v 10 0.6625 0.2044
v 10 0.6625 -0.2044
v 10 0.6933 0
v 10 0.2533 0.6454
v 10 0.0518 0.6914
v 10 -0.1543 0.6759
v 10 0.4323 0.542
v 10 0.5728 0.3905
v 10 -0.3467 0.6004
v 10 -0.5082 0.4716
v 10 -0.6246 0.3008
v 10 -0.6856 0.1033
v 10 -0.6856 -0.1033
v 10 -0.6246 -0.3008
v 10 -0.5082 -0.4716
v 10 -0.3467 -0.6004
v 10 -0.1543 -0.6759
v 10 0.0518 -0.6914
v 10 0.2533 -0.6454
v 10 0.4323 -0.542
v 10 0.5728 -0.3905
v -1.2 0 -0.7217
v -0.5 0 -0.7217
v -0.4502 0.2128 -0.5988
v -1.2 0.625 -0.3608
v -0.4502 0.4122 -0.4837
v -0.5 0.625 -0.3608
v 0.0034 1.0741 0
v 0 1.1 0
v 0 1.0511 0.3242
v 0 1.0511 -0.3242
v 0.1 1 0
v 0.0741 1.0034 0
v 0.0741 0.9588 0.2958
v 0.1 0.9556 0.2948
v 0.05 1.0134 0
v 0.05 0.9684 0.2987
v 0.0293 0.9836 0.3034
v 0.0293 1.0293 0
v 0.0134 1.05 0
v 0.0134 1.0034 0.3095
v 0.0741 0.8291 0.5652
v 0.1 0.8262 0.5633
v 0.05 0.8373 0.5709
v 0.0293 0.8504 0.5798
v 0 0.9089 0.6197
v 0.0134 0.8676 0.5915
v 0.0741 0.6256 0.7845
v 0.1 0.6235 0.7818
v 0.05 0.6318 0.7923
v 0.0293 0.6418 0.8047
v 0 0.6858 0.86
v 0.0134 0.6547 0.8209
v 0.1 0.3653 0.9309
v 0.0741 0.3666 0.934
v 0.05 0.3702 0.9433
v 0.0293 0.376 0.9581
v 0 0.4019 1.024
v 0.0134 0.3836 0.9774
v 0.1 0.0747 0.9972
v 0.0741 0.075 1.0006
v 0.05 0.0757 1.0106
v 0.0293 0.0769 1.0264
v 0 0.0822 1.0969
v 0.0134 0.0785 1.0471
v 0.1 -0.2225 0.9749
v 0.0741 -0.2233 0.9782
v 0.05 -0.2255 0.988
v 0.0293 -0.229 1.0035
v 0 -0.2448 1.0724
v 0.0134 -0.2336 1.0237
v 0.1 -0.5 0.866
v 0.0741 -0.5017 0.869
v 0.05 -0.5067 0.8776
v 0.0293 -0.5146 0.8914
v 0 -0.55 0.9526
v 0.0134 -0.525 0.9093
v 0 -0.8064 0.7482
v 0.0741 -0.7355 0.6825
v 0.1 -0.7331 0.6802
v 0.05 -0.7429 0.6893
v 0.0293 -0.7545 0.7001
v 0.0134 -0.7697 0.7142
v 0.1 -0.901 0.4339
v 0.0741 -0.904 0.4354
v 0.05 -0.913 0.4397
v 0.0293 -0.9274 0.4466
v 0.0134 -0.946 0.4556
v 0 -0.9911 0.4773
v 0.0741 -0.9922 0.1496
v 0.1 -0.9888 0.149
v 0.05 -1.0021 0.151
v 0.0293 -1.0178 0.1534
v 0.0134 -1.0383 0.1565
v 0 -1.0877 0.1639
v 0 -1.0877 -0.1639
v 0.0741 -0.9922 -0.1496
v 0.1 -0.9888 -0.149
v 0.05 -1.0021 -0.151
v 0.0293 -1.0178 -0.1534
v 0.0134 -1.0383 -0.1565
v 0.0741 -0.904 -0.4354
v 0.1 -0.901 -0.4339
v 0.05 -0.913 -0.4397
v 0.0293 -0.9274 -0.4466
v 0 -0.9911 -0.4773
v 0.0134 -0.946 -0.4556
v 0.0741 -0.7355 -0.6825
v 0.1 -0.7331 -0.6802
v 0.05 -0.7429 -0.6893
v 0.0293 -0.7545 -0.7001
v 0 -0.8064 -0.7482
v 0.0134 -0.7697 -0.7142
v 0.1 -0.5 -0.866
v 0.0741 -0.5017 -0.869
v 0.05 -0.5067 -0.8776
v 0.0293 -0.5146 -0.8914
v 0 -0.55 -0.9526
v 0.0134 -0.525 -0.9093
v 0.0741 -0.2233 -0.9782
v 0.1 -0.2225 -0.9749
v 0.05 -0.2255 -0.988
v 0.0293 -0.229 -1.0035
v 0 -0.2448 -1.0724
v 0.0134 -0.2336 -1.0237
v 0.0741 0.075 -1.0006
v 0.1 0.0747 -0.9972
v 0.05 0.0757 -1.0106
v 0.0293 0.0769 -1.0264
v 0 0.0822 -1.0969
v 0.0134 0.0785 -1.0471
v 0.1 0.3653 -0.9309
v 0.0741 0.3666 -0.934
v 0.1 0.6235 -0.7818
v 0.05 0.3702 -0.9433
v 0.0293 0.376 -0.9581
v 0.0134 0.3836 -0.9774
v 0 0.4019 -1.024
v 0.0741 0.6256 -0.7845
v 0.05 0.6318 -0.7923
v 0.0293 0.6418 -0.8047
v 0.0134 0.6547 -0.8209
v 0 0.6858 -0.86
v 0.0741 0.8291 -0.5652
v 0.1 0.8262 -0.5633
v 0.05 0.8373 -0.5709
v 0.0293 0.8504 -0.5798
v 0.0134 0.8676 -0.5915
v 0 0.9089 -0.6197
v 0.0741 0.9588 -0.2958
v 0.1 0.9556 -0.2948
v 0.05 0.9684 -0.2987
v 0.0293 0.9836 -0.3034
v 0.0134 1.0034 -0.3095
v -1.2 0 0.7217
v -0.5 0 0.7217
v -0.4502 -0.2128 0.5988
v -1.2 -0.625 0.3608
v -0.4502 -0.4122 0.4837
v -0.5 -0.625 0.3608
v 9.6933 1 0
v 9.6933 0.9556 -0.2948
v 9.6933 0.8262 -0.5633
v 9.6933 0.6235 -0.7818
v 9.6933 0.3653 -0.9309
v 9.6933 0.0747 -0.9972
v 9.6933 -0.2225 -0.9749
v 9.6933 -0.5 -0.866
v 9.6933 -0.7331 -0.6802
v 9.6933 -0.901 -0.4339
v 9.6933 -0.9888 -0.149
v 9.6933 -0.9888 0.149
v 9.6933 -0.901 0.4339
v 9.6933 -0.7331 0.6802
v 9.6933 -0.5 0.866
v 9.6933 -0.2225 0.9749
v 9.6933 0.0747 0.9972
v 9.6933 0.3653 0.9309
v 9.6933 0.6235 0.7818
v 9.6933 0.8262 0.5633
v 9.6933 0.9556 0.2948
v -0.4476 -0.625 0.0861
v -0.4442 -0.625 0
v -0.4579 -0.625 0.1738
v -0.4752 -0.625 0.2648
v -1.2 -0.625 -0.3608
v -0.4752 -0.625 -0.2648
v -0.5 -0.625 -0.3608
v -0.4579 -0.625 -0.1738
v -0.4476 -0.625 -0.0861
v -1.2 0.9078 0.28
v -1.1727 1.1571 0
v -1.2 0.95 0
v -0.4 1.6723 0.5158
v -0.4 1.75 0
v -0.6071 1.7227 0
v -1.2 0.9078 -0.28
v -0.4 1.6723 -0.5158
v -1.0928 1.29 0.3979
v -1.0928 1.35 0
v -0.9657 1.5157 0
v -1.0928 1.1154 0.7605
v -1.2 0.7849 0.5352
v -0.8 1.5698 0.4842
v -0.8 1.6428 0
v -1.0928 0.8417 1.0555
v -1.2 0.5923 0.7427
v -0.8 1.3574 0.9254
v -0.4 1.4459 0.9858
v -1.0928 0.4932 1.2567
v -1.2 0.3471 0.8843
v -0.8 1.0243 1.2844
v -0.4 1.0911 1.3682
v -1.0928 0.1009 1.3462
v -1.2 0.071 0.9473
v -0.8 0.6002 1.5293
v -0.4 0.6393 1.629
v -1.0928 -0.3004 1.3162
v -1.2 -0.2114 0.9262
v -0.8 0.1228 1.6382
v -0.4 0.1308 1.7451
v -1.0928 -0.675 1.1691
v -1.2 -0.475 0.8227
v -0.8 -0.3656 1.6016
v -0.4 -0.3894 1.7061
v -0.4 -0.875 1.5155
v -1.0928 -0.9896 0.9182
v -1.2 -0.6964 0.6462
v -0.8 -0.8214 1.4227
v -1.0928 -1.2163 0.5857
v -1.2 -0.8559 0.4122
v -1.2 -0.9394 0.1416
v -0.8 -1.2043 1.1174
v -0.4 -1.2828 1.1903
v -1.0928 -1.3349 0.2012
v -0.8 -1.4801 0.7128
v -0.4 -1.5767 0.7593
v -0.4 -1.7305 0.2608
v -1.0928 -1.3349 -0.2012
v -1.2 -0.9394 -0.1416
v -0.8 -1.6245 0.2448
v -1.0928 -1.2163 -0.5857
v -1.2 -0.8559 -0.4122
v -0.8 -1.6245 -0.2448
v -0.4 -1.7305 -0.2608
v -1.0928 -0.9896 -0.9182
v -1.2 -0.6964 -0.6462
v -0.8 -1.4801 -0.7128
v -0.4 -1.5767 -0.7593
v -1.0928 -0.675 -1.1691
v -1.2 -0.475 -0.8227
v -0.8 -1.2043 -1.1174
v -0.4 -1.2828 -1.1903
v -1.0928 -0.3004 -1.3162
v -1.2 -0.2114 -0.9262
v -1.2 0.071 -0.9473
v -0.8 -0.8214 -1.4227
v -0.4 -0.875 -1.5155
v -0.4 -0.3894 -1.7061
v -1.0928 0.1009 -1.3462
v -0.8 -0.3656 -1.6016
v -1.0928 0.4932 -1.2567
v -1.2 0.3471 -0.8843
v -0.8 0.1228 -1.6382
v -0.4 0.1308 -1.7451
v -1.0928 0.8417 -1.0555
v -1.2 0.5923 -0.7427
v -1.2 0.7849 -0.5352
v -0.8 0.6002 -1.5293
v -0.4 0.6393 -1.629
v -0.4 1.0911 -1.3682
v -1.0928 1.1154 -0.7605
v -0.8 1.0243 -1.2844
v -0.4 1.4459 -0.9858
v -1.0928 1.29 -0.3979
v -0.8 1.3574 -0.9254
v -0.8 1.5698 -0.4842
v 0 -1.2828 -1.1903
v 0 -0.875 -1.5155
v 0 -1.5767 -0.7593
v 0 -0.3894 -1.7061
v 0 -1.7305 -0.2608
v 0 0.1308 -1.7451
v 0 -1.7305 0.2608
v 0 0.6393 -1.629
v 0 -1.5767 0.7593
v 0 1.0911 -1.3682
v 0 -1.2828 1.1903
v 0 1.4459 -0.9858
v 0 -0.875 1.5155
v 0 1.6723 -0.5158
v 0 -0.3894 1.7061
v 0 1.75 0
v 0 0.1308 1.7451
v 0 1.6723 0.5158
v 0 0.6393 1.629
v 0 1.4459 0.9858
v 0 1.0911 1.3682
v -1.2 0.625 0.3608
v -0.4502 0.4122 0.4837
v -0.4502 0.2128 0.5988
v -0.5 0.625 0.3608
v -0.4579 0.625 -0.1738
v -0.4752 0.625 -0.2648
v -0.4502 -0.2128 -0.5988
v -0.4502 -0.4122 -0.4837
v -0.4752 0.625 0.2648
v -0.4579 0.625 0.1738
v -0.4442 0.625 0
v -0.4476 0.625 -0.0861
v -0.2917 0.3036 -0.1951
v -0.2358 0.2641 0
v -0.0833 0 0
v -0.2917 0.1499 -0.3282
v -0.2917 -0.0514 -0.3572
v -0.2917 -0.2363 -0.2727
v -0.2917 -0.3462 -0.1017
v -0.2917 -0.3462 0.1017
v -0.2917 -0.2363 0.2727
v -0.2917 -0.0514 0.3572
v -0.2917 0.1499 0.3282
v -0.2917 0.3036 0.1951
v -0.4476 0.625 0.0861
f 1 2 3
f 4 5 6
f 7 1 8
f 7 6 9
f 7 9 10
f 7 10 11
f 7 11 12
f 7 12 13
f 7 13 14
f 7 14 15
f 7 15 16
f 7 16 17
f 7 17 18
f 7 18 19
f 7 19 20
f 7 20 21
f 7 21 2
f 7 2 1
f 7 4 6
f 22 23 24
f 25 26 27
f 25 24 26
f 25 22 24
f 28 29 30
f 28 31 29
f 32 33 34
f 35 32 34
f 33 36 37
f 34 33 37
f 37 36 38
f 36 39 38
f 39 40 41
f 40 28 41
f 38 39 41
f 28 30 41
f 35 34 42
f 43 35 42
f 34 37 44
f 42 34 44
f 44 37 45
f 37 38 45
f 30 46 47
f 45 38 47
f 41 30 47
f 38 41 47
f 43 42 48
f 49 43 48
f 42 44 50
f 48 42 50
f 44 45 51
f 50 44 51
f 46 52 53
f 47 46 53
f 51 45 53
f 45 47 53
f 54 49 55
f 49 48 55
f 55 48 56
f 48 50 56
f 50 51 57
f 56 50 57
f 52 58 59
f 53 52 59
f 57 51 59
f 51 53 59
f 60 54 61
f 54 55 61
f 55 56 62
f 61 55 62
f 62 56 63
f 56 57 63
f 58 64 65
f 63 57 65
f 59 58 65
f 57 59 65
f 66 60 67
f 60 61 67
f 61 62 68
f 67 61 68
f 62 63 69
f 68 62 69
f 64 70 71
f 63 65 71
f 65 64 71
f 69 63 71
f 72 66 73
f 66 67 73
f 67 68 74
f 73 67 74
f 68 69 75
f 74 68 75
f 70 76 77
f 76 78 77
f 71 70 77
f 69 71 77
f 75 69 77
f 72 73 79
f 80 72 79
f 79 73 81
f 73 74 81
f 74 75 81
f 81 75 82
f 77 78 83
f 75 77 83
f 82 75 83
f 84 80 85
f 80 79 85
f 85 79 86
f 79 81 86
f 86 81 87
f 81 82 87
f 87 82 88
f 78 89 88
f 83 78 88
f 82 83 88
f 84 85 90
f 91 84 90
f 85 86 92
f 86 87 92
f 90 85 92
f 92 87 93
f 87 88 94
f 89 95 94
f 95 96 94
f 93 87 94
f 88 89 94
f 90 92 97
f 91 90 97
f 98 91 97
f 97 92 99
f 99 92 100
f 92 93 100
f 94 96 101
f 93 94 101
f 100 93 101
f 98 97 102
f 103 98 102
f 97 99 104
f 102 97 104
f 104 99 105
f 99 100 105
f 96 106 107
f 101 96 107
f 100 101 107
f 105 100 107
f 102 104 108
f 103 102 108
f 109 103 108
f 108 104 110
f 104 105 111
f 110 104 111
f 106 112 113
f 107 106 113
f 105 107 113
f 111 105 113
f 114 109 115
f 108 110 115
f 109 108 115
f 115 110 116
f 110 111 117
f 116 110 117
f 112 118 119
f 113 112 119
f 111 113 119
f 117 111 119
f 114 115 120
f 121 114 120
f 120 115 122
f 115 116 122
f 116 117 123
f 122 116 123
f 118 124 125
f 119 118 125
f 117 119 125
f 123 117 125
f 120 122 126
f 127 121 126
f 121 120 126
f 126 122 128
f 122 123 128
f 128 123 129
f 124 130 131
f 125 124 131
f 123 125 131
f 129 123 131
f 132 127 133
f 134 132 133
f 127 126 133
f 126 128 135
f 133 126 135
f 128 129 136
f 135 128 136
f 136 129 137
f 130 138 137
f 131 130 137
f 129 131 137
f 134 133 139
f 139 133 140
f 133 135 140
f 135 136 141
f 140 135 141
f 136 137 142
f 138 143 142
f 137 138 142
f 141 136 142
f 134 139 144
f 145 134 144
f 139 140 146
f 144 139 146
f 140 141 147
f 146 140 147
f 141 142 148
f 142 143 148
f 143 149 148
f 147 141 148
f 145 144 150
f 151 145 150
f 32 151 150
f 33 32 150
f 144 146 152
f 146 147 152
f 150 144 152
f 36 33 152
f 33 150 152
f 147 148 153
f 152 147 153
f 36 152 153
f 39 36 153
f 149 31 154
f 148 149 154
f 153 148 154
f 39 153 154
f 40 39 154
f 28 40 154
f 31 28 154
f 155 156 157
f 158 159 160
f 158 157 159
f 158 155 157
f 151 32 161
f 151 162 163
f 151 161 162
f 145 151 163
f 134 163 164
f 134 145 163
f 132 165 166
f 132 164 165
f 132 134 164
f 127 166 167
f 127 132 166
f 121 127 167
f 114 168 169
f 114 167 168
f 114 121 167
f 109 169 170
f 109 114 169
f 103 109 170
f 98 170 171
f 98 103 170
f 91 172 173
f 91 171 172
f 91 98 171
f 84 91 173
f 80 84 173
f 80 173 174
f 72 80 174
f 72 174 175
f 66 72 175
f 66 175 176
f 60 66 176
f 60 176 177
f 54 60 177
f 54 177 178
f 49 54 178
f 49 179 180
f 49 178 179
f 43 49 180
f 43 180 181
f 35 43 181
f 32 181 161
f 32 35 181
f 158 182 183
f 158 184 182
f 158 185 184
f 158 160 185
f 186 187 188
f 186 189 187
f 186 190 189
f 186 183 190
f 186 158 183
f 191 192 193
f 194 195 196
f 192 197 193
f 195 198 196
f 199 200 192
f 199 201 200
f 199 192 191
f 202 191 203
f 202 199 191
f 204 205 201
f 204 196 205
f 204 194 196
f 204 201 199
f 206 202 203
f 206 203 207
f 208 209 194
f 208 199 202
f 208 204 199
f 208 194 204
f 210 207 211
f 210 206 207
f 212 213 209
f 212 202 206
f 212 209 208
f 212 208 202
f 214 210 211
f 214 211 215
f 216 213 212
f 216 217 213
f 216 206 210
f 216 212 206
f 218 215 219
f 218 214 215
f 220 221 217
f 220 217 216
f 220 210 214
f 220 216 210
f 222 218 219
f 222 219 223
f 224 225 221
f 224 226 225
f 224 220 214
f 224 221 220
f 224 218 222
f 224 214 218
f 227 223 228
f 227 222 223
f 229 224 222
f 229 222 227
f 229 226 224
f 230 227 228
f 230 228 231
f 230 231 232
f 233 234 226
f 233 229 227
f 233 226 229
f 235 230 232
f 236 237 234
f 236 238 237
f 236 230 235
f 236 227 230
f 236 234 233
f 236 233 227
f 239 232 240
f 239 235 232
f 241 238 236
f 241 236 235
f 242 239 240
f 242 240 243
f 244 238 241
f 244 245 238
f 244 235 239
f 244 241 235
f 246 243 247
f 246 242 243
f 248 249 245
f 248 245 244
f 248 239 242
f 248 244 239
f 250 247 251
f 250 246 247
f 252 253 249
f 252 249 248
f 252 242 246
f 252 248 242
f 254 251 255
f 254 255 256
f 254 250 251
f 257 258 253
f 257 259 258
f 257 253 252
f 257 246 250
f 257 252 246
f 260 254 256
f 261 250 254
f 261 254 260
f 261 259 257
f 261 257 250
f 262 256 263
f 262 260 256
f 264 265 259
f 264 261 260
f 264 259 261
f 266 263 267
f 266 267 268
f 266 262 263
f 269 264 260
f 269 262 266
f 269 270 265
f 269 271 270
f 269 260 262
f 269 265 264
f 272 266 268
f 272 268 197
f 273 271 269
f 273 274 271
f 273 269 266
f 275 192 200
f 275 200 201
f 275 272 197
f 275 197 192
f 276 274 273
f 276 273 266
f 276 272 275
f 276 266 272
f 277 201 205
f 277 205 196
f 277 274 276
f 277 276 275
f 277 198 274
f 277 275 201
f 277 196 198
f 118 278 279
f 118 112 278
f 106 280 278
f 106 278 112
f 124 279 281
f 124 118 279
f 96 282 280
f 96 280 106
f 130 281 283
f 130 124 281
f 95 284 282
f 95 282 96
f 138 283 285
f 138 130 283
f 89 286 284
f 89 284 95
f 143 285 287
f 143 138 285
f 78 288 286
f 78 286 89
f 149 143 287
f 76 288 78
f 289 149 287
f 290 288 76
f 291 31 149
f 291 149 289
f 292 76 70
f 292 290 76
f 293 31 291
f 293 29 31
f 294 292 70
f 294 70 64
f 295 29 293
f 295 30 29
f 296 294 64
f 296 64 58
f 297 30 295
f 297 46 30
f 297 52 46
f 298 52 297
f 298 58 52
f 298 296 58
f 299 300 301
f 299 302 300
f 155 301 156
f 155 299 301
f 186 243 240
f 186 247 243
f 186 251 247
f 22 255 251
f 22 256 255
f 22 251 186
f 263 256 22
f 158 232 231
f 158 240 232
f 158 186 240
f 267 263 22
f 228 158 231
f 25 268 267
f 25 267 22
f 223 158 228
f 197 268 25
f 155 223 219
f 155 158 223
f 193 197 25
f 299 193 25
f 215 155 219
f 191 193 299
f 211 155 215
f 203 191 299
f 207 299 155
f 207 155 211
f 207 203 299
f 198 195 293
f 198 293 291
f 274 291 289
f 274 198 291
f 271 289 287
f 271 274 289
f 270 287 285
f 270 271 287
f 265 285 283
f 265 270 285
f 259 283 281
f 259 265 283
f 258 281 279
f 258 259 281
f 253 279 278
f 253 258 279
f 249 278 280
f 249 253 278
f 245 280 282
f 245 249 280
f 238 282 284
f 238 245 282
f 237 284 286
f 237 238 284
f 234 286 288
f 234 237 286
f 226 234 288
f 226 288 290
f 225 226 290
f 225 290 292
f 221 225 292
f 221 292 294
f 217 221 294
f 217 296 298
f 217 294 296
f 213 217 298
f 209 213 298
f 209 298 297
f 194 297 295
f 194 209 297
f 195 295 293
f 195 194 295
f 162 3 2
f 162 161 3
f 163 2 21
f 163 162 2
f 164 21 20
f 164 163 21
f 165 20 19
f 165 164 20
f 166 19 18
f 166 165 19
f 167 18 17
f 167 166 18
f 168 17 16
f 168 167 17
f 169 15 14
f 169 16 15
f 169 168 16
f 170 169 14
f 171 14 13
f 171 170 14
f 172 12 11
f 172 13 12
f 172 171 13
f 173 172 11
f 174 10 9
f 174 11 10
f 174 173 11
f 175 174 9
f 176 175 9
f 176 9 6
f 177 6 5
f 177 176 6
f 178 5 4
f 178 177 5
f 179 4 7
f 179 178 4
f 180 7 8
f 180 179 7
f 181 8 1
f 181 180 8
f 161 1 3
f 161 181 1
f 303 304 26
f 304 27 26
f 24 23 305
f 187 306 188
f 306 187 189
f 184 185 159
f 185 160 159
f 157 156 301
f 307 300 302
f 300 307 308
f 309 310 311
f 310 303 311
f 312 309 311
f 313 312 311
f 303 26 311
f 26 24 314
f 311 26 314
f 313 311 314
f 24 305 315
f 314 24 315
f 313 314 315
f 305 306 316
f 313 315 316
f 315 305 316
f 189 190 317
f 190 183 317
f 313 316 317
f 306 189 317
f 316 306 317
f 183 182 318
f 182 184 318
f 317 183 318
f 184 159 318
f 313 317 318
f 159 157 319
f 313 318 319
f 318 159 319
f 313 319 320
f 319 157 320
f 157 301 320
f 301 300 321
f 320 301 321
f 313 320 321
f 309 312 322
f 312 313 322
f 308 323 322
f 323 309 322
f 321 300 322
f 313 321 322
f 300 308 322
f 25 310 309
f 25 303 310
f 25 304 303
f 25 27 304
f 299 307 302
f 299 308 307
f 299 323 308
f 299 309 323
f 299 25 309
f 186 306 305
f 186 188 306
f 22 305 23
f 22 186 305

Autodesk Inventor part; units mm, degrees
ref_plane "YZ Plane" through (0, 0, 0) normal (1, 0, 0) x (0, 1, 0)
ref_plane "XZ Plane" through (0, 0, 0) normal (0, 1, 0) x (-1, 0, 0)
sketch "Sketch1" plane through (0, 0, 0) normal (0, 0, 1) x (1, 0, 0)
  line L0 (-0.0833, 0) -> (10, 0)
  line L1 (10, 0) -> (10, 1)
  line L2 (10, 1) -> (7, 1)
  line L3 (7, 1) -> (6.6932, 1)
  line L4 (6.6932, 1) -> (0, 1)
  line L5 (0, 1) -> (0, 1.75)
  line L6 (0, 1.75) -> (-1.2, 1.75)
  line L7 (-1.2, 1.75) -> (-1.2, 0.7217)
  line L8 (-1.2, 0.7217) -> (-0.5, 0.7217)
  line L9 (-0.5, 0.7217) -> (-0.0833, 0)
  line L10 (-3.44, 0) -> (12.24, 0) projected
  line L11 (0, -0.35) -> (0, 2.1) projected
  line L12 (7, 1) -> (0, 1) construction
  dimension "d1" = 3
  dimension "d2" = 0.3068
  dimension "d3" = 1.2
  dimension "d4" = 0.7
  dimension "d5" = 60
  dimension "d6" = 2
  dimension "d7" = 2
  dimension "d8" = 1.4434
  dimension "d9" = 3.5
  dimension "d26" = 10
revolve "Body" add sketch "Sketch1" angle 360 about axis through (-0.0833, 0, 0) along (1, 0, 0)
sketch "Sketch2" plane through (-1.2, 0, 0) normal (-1, 0, 0) x (0, 0, 1)
  circle A0 centre (0, 0) radius 0.7217 projected
  line L0 (0, -2.45) -> (0, 2.45) projected
  line L1 (-2.45, 0) -> (2.45, 0) projected
  line L2 (0.7217, 0) -> (0.3608, -0.625)
  line L3 (0.3608, -0.625) -> (-0.3608, -0.625)
  line L4 (-0.3608, -0.625) -> (-0.7217, 0)
  line L5 (-0.7217, 0) -> (-0.3608, 0.625)
  line L6 (-0.3608, 0.625) -> (0.3608, 0.625)
  line L7 (0.3608, 0.625) -> (0.7217, 0)
extrude "Slot" add sketch "Sketch2" against normal up to next contours L7 A0 | A0 L2 | L6 L0 A0 | A0 L0 L3 | L0 L6 A0 | A0 L3 L0 | L4 A0 | A0 L5
fillet "Fillet1" radius 0.8 1 edges at (-1.2, -1.75, 0)
chamfer "Chamfer1" distance 0.3067 distance2 0.3067 1 edges at (10, -1, 0) measured on face at (10, -0.5392, -0.3309)
ref_plane "Work Plane1" through (29, 0, 0) normal (0, -1, 0) x (1, 0, 0)
fillet "Fillet2" radius 0.1 1 edges at (0, -1, 0)
thread "Thread2" size "M2x0.4" class "6g" standard "ANSI Metric M Profile" full length
equation "\"d15\" = -0.5 * SPD + 0.5 * GD"
equation "\"d16\" = GUL"
equation "\"GD\" = NND"
equation "\"NLG\" = 6"
equation "\"GEL\" = 4.5"
equation "\"KOD\" = 5.7"
equation "\"KOH\" = 1.65"
equation "\"INTI\" = 1.04"
equation "\"GAL\" = 0.61345 * PTC"
equation "\"GUL\" = 0.61345 * PTC"
equation "\"BDM\" = NND"
equation "\"SW\" = 2"
equation "\"RR\" = 1.45"
equation "\"SPD\" = NND - 1.2269 * PTC"
equation "\"R\" = 0.3"
equation "\"TOA\" = 30deg"
equation "\"GD1\" = THREADDIA - 1.2269 * PTC"
equation "\"THREADDIA\" = 3"
equation "\"PTC\" = 0.5"
equation "\"NND\" = 3"
equation "\"KOH1\" = 0.2"
equation "\"E0\" = 2.303"
properties part number "M2x10 Bolt" material "Stainless Steel"
